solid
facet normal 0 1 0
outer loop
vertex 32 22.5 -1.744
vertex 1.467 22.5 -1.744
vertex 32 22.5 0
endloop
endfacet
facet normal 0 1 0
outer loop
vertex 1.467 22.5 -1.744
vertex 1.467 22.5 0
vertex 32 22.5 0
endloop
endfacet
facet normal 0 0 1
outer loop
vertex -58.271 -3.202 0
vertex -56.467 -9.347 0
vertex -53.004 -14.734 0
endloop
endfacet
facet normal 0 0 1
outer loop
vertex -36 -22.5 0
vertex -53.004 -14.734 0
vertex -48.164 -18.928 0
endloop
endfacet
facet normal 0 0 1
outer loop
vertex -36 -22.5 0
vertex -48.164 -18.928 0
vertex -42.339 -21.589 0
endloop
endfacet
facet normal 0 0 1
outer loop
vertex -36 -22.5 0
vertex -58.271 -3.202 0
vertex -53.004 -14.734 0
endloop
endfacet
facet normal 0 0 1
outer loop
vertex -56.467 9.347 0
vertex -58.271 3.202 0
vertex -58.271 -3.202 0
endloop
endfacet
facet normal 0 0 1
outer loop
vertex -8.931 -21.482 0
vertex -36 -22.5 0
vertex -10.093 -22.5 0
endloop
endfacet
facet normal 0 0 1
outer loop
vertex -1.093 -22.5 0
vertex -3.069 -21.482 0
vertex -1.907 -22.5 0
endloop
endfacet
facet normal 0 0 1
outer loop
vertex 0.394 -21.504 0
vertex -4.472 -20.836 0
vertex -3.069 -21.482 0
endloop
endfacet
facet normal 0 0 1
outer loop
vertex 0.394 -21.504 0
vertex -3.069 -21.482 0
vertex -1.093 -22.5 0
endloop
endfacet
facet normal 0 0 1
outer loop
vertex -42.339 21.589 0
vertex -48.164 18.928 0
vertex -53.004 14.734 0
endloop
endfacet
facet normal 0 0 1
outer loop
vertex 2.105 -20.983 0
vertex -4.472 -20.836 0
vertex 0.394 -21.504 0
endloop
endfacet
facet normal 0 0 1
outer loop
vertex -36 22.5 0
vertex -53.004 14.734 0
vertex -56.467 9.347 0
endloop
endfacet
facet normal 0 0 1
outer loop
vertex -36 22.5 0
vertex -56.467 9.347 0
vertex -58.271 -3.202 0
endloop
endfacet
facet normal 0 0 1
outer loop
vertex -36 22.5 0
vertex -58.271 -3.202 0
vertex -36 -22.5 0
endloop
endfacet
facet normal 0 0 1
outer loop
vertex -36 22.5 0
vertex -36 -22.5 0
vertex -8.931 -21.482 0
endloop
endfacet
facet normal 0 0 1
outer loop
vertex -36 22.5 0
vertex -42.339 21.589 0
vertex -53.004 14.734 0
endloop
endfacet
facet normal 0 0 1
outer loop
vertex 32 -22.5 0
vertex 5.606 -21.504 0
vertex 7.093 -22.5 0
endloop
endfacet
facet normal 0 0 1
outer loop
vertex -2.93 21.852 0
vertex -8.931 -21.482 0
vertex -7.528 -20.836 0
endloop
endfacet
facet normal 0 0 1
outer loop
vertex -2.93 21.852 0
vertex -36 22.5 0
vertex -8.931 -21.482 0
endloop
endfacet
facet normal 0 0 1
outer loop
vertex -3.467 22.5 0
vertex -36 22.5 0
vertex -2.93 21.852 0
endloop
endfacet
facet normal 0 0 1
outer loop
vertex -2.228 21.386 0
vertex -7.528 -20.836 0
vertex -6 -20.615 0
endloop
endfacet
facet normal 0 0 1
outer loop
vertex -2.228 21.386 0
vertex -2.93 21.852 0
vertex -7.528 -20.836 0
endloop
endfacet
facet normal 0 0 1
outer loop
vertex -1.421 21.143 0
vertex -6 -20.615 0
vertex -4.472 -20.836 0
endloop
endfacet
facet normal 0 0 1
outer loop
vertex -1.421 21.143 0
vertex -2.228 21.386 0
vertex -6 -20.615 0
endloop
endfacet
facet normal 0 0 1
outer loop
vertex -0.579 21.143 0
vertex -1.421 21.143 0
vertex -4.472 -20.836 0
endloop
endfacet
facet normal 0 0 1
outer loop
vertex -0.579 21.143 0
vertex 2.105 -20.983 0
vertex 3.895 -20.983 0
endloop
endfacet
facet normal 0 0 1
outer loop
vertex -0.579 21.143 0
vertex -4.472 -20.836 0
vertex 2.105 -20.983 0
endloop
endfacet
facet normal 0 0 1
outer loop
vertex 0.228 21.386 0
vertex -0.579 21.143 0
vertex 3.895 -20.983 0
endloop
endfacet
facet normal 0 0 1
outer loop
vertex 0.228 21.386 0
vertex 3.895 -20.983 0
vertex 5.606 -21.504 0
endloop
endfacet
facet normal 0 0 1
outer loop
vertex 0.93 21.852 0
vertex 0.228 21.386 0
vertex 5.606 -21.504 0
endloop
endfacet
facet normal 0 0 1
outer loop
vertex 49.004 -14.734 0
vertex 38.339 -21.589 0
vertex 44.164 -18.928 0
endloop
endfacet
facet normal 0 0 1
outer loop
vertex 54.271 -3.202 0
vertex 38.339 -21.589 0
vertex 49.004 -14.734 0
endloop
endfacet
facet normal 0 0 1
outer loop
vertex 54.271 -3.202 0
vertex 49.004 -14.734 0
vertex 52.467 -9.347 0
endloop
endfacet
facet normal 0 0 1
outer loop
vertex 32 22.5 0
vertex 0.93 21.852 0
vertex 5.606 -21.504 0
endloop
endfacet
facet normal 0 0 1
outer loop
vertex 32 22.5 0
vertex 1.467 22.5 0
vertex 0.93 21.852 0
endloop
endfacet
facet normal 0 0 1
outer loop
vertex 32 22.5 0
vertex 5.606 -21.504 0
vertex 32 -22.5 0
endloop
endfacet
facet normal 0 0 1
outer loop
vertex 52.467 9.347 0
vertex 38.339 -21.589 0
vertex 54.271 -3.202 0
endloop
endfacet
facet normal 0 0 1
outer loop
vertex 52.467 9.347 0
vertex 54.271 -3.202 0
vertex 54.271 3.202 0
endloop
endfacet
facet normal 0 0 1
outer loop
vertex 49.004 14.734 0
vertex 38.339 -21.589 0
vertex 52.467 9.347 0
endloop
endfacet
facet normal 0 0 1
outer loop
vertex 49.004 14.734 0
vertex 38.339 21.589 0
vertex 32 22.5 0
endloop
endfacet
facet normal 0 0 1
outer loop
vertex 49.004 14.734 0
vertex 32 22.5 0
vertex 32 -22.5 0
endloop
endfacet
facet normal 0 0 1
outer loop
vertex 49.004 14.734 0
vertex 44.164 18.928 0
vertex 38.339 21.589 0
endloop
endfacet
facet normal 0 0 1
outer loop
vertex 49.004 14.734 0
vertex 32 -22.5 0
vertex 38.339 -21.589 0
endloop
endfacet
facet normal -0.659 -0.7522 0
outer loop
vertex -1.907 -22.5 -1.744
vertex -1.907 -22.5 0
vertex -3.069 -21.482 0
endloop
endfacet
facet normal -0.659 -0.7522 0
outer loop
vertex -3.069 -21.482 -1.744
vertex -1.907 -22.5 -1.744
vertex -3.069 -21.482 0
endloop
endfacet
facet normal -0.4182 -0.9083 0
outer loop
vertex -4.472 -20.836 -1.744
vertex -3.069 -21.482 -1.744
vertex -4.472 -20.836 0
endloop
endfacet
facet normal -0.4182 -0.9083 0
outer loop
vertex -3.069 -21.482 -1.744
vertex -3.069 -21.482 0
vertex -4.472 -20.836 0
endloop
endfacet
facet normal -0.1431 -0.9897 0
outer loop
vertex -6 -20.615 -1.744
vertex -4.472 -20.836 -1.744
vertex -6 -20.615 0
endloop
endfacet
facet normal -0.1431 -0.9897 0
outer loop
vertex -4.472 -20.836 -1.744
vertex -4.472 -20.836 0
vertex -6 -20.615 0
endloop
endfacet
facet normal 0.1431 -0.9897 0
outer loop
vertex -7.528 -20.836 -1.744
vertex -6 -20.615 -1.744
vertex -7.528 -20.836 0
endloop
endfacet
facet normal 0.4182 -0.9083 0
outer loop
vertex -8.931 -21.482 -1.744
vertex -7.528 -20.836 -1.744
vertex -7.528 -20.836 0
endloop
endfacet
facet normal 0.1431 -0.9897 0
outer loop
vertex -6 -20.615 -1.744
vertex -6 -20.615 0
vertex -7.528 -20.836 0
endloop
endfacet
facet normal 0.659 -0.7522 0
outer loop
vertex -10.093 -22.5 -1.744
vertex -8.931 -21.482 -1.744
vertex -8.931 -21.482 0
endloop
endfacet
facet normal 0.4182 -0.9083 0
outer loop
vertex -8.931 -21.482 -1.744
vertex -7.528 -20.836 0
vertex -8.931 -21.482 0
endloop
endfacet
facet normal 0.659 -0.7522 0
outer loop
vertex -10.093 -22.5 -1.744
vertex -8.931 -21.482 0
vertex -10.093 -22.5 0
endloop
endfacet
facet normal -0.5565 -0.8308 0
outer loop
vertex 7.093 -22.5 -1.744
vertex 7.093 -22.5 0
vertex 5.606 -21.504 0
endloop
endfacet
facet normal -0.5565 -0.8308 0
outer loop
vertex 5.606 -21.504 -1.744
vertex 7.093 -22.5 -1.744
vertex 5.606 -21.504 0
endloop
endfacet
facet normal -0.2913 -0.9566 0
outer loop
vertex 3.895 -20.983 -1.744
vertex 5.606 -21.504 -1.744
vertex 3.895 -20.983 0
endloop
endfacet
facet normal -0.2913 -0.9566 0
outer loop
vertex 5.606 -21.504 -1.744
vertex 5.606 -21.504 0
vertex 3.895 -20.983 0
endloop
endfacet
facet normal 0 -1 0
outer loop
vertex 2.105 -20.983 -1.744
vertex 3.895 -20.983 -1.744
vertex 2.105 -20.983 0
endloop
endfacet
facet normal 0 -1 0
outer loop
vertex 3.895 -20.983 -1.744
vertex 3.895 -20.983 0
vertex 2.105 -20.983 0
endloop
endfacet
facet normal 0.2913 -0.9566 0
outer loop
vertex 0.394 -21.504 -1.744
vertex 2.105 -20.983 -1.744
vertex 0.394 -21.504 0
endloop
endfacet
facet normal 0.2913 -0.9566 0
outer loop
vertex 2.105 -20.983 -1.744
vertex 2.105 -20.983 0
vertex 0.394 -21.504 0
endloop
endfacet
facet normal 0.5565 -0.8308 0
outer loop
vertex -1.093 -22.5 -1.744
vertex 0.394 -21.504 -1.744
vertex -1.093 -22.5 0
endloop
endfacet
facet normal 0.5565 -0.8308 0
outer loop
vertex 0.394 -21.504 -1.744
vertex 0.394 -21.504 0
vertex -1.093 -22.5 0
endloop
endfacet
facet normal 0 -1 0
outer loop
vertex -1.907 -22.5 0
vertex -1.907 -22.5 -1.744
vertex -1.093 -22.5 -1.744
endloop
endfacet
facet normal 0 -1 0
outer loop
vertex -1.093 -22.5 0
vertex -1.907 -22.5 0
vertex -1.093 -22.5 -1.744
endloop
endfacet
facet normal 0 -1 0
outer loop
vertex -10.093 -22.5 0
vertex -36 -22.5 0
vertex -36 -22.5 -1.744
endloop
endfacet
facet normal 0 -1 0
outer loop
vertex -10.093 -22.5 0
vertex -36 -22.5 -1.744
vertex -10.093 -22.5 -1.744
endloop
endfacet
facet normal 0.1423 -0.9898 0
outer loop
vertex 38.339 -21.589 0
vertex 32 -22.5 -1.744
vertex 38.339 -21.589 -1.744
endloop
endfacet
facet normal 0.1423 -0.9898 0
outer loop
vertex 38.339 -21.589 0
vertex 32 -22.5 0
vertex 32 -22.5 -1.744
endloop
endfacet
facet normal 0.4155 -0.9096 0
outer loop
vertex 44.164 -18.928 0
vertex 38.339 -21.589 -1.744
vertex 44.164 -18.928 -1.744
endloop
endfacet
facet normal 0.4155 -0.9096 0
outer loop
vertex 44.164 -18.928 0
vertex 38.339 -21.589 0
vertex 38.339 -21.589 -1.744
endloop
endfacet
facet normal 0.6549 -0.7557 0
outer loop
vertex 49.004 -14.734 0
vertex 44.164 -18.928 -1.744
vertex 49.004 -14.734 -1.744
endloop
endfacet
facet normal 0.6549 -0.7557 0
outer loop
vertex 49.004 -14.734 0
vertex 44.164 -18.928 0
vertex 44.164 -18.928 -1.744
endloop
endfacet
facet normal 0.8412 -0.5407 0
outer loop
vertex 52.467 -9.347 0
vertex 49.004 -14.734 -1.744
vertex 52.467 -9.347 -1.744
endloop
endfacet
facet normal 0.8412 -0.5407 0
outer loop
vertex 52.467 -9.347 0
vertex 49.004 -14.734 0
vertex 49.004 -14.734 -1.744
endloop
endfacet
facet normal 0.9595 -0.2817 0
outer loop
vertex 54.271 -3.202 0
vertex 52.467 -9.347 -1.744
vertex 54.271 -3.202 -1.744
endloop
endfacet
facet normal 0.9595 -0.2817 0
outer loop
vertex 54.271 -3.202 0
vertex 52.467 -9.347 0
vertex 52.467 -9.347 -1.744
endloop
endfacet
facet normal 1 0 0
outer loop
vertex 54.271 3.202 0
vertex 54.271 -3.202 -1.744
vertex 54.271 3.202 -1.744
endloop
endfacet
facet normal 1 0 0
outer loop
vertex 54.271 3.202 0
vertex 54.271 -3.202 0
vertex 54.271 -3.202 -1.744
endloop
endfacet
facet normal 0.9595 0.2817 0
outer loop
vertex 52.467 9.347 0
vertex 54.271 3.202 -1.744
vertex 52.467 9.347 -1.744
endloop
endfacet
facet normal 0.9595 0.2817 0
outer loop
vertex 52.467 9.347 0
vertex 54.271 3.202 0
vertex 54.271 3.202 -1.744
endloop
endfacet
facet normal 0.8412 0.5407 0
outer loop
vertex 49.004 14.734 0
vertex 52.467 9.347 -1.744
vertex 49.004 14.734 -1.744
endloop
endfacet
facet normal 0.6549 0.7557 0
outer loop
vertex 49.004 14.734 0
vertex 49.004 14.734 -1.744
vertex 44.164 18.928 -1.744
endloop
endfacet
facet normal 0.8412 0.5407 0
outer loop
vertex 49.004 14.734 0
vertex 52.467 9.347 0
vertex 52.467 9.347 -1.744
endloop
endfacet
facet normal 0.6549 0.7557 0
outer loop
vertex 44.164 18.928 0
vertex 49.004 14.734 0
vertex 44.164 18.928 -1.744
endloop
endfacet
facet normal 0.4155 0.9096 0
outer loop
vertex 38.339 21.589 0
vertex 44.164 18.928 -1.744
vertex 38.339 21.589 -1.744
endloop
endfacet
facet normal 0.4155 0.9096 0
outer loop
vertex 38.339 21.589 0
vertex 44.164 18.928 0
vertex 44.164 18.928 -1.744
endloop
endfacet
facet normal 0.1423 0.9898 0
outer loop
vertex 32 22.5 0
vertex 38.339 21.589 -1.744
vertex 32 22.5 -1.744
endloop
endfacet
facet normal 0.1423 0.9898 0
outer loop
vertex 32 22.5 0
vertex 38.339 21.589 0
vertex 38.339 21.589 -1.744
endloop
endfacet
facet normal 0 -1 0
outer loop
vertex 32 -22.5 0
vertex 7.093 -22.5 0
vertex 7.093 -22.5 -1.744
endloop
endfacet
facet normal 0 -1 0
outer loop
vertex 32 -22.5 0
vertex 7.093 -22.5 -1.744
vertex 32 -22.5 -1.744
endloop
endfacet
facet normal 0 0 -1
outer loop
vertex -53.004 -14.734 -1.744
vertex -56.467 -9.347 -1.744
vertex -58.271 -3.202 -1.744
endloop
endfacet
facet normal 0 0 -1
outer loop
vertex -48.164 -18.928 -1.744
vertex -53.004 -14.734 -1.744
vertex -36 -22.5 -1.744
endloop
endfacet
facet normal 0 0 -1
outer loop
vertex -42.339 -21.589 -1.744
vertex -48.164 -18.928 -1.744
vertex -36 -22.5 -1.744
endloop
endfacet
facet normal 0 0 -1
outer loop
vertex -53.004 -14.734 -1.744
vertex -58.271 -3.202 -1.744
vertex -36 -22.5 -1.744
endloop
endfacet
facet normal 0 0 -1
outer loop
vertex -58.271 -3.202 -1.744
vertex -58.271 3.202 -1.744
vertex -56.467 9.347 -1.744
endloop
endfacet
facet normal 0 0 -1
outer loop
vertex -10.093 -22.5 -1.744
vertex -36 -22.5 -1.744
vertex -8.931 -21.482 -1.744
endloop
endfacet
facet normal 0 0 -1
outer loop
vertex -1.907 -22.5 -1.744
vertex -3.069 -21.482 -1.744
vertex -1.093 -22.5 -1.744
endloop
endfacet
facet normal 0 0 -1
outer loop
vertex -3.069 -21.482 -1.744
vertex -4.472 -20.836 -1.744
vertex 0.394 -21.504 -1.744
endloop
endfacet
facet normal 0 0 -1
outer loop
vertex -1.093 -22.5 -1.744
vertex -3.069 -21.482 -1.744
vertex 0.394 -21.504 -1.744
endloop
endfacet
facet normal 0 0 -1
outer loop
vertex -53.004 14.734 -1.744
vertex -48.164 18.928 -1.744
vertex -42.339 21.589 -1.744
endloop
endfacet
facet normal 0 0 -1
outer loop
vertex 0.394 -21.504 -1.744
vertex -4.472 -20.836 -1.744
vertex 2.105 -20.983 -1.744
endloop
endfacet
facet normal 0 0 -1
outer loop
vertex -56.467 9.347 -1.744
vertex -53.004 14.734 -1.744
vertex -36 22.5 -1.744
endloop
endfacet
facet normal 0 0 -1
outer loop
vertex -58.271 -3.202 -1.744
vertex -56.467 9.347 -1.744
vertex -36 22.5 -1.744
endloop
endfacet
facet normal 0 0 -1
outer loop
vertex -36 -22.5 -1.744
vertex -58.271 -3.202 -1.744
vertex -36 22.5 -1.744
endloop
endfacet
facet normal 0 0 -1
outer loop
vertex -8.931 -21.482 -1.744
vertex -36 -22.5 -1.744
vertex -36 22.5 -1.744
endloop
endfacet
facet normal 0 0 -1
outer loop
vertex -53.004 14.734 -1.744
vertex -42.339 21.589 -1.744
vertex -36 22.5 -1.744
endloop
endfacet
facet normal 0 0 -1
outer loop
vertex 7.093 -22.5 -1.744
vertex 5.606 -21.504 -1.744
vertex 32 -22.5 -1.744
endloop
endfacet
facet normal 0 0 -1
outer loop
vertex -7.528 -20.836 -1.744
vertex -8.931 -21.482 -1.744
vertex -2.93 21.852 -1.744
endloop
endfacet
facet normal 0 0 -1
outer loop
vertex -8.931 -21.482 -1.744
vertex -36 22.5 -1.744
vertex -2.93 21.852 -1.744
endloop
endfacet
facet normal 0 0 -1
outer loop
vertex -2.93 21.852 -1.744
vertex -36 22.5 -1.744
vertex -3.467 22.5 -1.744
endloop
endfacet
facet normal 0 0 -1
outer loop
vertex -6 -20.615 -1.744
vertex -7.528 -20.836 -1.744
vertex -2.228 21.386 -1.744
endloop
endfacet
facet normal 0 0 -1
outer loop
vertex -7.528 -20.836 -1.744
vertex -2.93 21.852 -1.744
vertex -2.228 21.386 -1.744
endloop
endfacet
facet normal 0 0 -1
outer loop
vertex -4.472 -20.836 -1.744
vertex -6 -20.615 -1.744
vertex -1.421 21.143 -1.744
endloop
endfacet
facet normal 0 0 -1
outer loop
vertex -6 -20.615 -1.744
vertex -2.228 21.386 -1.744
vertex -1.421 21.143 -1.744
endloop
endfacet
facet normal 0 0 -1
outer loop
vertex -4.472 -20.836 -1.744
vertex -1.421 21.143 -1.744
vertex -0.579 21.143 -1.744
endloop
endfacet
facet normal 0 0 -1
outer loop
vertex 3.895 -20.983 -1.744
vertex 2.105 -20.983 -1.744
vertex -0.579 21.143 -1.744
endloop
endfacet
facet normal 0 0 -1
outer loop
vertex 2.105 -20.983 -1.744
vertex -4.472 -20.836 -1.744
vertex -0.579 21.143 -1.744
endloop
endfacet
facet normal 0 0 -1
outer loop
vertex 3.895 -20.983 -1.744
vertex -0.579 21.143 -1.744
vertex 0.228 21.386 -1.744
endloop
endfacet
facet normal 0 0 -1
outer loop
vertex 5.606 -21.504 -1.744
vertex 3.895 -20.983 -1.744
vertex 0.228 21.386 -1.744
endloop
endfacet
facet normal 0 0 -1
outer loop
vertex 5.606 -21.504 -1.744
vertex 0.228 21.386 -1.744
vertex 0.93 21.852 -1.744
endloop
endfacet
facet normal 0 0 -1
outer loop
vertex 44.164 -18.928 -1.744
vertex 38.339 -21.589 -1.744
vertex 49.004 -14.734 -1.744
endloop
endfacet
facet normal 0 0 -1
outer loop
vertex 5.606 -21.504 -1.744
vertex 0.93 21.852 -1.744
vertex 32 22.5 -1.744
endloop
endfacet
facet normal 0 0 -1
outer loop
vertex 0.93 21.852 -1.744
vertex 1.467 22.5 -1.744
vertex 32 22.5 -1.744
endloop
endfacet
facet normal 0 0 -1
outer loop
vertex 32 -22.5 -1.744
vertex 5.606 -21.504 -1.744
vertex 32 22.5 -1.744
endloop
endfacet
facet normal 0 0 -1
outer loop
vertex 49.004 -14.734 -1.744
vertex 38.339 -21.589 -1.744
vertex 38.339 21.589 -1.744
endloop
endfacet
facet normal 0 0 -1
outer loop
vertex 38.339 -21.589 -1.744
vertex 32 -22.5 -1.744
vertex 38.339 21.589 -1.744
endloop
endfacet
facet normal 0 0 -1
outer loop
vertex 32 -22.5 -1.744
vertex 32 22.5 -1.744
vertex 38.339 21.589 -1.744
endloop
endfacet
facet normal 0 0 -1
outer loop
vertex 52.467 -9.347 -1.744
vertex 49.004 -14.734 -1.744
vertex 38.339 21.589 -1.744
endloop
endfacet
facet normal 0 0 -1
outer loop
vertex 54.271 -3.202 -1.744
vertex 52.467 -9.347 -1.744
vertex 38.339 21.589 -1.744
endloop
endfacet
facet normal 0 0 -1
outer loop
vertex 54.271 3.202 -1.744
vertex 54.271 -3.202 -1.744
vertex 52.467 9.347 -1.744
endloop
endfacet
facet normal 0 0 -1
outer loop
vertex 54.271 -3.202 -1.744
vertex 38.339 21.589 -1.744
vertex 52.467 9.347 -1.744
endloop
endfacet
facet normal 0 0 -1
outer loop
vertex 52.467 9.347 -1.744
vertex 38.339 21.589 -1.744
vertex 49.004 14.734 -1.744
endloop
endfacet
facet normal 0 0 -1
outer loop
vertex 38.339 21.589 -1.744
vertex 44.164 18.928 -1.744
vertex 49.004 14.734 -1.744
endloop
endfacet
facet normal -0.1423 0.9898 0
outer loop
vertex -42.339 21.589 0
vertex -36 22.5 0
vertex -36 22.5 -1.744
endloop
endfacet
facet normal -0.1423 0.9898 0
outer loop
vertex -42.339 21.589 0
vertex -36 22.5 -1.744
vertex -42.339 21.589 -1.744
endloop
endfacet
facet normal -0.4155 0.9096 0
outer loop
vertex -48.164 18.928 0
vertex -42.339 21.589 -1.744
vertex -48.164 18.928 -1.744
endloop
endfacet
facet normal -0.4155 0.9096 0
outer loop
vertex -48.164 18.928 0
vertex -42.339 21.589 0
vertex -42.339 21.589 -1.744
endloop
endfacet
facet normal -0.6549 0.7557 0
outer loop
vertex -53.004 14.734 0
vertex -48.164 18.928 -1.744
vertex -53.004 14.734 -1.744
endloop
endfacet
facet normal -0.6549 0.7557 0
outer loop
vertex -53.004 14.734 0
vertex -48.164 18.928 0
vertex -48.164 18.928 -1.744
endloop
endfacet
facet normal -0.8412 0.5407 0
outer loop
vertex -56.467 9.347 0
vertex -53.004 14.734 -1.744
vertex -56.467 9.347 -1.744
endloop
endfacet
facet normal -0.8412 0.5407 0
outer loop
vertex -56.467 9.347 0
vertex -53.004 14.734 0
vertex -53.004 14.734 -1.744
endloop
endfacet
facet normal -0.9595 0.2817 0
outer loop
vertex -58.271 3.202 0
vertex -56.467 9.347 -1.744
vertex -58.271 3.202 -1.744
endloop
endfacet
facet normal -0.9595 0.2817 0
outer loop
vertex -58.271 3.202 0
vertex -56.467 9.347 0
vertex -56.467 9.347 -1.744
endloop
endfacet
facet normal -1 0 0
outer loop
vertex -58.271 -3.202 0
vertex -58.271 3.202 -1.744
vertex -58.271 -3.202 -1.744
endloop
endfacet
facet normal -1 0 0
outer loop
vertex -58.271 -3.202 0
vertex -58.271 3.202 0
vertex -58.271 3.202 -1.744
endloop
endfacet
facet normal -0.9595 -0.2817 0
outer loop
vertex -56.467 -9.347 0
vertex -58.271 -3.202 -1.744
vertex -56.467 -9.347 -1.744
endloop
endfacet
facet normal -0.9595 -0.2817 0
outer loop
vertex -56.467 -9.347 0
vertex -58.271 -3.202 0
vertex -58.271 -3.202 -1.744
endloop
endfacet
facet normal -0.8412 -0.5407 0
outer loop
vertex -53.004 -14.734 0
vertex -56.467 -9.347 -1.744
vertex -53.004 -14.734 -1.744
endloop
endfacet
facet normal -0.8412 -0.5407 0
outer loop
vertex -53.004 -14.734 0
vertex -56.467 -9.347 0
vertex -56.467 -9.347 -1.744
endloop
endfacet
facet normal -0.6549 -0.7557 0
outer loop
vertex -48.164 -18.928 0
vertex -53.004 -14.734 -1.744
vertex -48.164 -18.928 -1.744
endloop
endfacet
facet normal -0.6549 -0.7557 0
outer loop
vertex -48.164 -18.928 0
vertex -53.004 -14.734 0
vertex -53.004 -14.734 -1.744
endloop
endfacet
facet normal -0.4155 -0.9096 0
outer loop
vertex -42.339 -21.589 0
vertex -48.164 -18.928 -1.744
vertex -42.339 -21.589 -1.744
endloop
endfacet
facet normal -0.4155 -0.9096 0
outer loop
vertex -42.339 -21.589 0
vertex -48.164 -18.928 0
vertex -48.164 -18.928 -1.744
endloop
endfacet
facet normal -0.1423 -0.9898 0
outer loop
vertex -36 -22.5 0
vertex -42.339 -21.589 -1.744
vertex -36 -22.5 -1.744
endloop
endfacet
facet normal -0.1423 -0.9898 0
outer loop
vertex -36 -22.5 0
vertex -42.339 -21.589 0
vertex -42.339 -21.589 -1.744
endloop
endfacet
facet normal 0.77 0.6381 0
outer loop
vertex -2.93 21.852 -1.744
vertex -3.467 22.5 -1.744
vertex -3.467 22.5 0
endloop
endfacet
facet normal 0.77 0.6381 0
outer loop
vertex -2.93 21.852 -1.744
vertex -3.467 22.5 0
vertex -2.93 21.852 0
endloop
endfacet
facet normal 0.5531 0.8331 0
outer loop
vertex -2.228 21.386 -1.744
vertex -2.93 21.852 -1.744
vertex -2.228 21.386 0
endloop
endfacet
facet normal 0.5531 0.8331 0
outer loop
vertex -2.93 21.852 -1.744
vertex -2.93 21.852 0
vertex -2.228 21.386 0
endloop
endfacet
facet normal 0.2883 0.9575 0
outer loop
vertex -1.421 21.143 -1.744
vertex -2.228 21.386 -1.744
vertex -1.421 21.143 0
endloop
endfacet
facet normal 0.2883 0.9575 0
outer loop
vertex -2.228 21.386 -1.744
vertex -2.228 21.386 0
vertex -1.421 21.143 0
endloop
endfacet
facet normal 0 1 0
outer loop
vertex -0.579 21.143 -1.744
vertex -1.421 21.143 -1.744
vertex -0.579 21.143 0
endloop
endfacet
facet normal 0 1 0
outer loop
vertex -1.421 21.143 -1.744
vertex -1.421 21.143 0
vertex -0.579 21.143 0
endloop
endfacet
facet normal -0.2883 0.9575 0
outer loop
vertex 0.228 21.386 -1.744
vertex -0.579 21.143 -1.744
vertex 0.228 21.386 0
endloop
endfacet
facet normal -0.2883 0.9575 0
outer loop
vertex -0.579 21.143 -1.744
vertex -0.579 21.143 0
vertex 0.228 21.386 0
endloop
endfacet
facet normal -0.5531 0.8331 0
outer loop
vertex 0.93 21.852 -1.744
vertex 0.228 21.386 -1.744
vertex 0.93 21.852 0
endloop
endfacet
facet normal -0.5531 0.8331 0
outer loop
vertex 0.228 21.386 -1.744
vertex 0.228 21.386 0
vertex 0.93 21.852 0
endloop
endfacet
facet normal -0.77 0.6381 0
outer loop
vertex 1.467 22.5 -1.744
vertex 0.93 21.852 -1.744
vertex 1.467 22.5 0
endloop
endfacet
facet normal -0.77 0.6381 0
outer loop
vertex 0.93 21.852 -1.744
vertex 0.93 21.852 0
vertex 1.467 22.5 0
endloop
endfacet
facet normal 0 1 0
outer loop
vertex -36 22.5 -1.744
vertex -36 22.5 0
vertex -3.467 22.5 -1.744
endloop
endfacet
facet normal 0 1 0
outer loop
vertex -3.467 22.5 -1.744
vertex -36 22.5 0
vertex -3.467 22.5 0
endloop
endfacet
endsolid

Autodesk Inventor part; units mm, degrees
ref_plane "YZ Plane" through (0, 0, 0) normal (1, 0, 0) x (0, 1, 0)
ref_plane "XZ Plane" through (0, 0, 0) normal (0, 1, 0) x (-1, 0, 0)
sketch "Skizze1" plane through (0, 0, 0) normal (0, 0, 1) x (1, 0, 0)
  circle A0 centre (32, 0) radius 22.5
  circle A1 centre (-36, 0) radius 22.5
  line L0 (-36, -22.5) -> (32, -22.5)
  line L1 (-36, 22.5) -> (32, 22.5)
  circle A2 centre (-6, -26) radius 5.3852
  circle A3 centre (3, -27) radius 6.0828
  circle A4 centre (-1, 24) radius 2.8875
  point P0 (0, 0)
  point P1 (-10.0927, -22.5)
  point P2 (-1.9073, -22.5)
  point P3 (-1.0927, -22.5)
  point P4 (7.0927, -22.5)
  point P5 (1.4674, 22.5)
  point P6 (-3.4674, 22.5)
  dimension "d1" = 45
  dimension "d2" = 45
  dimension "d3" = 68
  dimension "d4" = 0
ref_plane "Arbeitsebene1" through (-62.5751, -29.26, -1.7438) normal (0, 0, -1) x (0, 1, 0)
extrude "Extrusion1" add sketch "Skizze1" against normal up to surface (1.7438 mm away) contours A0 | A0 L0 A3 A2 A1 L1 A4 | A1
equation "\"d2\" = d1"
